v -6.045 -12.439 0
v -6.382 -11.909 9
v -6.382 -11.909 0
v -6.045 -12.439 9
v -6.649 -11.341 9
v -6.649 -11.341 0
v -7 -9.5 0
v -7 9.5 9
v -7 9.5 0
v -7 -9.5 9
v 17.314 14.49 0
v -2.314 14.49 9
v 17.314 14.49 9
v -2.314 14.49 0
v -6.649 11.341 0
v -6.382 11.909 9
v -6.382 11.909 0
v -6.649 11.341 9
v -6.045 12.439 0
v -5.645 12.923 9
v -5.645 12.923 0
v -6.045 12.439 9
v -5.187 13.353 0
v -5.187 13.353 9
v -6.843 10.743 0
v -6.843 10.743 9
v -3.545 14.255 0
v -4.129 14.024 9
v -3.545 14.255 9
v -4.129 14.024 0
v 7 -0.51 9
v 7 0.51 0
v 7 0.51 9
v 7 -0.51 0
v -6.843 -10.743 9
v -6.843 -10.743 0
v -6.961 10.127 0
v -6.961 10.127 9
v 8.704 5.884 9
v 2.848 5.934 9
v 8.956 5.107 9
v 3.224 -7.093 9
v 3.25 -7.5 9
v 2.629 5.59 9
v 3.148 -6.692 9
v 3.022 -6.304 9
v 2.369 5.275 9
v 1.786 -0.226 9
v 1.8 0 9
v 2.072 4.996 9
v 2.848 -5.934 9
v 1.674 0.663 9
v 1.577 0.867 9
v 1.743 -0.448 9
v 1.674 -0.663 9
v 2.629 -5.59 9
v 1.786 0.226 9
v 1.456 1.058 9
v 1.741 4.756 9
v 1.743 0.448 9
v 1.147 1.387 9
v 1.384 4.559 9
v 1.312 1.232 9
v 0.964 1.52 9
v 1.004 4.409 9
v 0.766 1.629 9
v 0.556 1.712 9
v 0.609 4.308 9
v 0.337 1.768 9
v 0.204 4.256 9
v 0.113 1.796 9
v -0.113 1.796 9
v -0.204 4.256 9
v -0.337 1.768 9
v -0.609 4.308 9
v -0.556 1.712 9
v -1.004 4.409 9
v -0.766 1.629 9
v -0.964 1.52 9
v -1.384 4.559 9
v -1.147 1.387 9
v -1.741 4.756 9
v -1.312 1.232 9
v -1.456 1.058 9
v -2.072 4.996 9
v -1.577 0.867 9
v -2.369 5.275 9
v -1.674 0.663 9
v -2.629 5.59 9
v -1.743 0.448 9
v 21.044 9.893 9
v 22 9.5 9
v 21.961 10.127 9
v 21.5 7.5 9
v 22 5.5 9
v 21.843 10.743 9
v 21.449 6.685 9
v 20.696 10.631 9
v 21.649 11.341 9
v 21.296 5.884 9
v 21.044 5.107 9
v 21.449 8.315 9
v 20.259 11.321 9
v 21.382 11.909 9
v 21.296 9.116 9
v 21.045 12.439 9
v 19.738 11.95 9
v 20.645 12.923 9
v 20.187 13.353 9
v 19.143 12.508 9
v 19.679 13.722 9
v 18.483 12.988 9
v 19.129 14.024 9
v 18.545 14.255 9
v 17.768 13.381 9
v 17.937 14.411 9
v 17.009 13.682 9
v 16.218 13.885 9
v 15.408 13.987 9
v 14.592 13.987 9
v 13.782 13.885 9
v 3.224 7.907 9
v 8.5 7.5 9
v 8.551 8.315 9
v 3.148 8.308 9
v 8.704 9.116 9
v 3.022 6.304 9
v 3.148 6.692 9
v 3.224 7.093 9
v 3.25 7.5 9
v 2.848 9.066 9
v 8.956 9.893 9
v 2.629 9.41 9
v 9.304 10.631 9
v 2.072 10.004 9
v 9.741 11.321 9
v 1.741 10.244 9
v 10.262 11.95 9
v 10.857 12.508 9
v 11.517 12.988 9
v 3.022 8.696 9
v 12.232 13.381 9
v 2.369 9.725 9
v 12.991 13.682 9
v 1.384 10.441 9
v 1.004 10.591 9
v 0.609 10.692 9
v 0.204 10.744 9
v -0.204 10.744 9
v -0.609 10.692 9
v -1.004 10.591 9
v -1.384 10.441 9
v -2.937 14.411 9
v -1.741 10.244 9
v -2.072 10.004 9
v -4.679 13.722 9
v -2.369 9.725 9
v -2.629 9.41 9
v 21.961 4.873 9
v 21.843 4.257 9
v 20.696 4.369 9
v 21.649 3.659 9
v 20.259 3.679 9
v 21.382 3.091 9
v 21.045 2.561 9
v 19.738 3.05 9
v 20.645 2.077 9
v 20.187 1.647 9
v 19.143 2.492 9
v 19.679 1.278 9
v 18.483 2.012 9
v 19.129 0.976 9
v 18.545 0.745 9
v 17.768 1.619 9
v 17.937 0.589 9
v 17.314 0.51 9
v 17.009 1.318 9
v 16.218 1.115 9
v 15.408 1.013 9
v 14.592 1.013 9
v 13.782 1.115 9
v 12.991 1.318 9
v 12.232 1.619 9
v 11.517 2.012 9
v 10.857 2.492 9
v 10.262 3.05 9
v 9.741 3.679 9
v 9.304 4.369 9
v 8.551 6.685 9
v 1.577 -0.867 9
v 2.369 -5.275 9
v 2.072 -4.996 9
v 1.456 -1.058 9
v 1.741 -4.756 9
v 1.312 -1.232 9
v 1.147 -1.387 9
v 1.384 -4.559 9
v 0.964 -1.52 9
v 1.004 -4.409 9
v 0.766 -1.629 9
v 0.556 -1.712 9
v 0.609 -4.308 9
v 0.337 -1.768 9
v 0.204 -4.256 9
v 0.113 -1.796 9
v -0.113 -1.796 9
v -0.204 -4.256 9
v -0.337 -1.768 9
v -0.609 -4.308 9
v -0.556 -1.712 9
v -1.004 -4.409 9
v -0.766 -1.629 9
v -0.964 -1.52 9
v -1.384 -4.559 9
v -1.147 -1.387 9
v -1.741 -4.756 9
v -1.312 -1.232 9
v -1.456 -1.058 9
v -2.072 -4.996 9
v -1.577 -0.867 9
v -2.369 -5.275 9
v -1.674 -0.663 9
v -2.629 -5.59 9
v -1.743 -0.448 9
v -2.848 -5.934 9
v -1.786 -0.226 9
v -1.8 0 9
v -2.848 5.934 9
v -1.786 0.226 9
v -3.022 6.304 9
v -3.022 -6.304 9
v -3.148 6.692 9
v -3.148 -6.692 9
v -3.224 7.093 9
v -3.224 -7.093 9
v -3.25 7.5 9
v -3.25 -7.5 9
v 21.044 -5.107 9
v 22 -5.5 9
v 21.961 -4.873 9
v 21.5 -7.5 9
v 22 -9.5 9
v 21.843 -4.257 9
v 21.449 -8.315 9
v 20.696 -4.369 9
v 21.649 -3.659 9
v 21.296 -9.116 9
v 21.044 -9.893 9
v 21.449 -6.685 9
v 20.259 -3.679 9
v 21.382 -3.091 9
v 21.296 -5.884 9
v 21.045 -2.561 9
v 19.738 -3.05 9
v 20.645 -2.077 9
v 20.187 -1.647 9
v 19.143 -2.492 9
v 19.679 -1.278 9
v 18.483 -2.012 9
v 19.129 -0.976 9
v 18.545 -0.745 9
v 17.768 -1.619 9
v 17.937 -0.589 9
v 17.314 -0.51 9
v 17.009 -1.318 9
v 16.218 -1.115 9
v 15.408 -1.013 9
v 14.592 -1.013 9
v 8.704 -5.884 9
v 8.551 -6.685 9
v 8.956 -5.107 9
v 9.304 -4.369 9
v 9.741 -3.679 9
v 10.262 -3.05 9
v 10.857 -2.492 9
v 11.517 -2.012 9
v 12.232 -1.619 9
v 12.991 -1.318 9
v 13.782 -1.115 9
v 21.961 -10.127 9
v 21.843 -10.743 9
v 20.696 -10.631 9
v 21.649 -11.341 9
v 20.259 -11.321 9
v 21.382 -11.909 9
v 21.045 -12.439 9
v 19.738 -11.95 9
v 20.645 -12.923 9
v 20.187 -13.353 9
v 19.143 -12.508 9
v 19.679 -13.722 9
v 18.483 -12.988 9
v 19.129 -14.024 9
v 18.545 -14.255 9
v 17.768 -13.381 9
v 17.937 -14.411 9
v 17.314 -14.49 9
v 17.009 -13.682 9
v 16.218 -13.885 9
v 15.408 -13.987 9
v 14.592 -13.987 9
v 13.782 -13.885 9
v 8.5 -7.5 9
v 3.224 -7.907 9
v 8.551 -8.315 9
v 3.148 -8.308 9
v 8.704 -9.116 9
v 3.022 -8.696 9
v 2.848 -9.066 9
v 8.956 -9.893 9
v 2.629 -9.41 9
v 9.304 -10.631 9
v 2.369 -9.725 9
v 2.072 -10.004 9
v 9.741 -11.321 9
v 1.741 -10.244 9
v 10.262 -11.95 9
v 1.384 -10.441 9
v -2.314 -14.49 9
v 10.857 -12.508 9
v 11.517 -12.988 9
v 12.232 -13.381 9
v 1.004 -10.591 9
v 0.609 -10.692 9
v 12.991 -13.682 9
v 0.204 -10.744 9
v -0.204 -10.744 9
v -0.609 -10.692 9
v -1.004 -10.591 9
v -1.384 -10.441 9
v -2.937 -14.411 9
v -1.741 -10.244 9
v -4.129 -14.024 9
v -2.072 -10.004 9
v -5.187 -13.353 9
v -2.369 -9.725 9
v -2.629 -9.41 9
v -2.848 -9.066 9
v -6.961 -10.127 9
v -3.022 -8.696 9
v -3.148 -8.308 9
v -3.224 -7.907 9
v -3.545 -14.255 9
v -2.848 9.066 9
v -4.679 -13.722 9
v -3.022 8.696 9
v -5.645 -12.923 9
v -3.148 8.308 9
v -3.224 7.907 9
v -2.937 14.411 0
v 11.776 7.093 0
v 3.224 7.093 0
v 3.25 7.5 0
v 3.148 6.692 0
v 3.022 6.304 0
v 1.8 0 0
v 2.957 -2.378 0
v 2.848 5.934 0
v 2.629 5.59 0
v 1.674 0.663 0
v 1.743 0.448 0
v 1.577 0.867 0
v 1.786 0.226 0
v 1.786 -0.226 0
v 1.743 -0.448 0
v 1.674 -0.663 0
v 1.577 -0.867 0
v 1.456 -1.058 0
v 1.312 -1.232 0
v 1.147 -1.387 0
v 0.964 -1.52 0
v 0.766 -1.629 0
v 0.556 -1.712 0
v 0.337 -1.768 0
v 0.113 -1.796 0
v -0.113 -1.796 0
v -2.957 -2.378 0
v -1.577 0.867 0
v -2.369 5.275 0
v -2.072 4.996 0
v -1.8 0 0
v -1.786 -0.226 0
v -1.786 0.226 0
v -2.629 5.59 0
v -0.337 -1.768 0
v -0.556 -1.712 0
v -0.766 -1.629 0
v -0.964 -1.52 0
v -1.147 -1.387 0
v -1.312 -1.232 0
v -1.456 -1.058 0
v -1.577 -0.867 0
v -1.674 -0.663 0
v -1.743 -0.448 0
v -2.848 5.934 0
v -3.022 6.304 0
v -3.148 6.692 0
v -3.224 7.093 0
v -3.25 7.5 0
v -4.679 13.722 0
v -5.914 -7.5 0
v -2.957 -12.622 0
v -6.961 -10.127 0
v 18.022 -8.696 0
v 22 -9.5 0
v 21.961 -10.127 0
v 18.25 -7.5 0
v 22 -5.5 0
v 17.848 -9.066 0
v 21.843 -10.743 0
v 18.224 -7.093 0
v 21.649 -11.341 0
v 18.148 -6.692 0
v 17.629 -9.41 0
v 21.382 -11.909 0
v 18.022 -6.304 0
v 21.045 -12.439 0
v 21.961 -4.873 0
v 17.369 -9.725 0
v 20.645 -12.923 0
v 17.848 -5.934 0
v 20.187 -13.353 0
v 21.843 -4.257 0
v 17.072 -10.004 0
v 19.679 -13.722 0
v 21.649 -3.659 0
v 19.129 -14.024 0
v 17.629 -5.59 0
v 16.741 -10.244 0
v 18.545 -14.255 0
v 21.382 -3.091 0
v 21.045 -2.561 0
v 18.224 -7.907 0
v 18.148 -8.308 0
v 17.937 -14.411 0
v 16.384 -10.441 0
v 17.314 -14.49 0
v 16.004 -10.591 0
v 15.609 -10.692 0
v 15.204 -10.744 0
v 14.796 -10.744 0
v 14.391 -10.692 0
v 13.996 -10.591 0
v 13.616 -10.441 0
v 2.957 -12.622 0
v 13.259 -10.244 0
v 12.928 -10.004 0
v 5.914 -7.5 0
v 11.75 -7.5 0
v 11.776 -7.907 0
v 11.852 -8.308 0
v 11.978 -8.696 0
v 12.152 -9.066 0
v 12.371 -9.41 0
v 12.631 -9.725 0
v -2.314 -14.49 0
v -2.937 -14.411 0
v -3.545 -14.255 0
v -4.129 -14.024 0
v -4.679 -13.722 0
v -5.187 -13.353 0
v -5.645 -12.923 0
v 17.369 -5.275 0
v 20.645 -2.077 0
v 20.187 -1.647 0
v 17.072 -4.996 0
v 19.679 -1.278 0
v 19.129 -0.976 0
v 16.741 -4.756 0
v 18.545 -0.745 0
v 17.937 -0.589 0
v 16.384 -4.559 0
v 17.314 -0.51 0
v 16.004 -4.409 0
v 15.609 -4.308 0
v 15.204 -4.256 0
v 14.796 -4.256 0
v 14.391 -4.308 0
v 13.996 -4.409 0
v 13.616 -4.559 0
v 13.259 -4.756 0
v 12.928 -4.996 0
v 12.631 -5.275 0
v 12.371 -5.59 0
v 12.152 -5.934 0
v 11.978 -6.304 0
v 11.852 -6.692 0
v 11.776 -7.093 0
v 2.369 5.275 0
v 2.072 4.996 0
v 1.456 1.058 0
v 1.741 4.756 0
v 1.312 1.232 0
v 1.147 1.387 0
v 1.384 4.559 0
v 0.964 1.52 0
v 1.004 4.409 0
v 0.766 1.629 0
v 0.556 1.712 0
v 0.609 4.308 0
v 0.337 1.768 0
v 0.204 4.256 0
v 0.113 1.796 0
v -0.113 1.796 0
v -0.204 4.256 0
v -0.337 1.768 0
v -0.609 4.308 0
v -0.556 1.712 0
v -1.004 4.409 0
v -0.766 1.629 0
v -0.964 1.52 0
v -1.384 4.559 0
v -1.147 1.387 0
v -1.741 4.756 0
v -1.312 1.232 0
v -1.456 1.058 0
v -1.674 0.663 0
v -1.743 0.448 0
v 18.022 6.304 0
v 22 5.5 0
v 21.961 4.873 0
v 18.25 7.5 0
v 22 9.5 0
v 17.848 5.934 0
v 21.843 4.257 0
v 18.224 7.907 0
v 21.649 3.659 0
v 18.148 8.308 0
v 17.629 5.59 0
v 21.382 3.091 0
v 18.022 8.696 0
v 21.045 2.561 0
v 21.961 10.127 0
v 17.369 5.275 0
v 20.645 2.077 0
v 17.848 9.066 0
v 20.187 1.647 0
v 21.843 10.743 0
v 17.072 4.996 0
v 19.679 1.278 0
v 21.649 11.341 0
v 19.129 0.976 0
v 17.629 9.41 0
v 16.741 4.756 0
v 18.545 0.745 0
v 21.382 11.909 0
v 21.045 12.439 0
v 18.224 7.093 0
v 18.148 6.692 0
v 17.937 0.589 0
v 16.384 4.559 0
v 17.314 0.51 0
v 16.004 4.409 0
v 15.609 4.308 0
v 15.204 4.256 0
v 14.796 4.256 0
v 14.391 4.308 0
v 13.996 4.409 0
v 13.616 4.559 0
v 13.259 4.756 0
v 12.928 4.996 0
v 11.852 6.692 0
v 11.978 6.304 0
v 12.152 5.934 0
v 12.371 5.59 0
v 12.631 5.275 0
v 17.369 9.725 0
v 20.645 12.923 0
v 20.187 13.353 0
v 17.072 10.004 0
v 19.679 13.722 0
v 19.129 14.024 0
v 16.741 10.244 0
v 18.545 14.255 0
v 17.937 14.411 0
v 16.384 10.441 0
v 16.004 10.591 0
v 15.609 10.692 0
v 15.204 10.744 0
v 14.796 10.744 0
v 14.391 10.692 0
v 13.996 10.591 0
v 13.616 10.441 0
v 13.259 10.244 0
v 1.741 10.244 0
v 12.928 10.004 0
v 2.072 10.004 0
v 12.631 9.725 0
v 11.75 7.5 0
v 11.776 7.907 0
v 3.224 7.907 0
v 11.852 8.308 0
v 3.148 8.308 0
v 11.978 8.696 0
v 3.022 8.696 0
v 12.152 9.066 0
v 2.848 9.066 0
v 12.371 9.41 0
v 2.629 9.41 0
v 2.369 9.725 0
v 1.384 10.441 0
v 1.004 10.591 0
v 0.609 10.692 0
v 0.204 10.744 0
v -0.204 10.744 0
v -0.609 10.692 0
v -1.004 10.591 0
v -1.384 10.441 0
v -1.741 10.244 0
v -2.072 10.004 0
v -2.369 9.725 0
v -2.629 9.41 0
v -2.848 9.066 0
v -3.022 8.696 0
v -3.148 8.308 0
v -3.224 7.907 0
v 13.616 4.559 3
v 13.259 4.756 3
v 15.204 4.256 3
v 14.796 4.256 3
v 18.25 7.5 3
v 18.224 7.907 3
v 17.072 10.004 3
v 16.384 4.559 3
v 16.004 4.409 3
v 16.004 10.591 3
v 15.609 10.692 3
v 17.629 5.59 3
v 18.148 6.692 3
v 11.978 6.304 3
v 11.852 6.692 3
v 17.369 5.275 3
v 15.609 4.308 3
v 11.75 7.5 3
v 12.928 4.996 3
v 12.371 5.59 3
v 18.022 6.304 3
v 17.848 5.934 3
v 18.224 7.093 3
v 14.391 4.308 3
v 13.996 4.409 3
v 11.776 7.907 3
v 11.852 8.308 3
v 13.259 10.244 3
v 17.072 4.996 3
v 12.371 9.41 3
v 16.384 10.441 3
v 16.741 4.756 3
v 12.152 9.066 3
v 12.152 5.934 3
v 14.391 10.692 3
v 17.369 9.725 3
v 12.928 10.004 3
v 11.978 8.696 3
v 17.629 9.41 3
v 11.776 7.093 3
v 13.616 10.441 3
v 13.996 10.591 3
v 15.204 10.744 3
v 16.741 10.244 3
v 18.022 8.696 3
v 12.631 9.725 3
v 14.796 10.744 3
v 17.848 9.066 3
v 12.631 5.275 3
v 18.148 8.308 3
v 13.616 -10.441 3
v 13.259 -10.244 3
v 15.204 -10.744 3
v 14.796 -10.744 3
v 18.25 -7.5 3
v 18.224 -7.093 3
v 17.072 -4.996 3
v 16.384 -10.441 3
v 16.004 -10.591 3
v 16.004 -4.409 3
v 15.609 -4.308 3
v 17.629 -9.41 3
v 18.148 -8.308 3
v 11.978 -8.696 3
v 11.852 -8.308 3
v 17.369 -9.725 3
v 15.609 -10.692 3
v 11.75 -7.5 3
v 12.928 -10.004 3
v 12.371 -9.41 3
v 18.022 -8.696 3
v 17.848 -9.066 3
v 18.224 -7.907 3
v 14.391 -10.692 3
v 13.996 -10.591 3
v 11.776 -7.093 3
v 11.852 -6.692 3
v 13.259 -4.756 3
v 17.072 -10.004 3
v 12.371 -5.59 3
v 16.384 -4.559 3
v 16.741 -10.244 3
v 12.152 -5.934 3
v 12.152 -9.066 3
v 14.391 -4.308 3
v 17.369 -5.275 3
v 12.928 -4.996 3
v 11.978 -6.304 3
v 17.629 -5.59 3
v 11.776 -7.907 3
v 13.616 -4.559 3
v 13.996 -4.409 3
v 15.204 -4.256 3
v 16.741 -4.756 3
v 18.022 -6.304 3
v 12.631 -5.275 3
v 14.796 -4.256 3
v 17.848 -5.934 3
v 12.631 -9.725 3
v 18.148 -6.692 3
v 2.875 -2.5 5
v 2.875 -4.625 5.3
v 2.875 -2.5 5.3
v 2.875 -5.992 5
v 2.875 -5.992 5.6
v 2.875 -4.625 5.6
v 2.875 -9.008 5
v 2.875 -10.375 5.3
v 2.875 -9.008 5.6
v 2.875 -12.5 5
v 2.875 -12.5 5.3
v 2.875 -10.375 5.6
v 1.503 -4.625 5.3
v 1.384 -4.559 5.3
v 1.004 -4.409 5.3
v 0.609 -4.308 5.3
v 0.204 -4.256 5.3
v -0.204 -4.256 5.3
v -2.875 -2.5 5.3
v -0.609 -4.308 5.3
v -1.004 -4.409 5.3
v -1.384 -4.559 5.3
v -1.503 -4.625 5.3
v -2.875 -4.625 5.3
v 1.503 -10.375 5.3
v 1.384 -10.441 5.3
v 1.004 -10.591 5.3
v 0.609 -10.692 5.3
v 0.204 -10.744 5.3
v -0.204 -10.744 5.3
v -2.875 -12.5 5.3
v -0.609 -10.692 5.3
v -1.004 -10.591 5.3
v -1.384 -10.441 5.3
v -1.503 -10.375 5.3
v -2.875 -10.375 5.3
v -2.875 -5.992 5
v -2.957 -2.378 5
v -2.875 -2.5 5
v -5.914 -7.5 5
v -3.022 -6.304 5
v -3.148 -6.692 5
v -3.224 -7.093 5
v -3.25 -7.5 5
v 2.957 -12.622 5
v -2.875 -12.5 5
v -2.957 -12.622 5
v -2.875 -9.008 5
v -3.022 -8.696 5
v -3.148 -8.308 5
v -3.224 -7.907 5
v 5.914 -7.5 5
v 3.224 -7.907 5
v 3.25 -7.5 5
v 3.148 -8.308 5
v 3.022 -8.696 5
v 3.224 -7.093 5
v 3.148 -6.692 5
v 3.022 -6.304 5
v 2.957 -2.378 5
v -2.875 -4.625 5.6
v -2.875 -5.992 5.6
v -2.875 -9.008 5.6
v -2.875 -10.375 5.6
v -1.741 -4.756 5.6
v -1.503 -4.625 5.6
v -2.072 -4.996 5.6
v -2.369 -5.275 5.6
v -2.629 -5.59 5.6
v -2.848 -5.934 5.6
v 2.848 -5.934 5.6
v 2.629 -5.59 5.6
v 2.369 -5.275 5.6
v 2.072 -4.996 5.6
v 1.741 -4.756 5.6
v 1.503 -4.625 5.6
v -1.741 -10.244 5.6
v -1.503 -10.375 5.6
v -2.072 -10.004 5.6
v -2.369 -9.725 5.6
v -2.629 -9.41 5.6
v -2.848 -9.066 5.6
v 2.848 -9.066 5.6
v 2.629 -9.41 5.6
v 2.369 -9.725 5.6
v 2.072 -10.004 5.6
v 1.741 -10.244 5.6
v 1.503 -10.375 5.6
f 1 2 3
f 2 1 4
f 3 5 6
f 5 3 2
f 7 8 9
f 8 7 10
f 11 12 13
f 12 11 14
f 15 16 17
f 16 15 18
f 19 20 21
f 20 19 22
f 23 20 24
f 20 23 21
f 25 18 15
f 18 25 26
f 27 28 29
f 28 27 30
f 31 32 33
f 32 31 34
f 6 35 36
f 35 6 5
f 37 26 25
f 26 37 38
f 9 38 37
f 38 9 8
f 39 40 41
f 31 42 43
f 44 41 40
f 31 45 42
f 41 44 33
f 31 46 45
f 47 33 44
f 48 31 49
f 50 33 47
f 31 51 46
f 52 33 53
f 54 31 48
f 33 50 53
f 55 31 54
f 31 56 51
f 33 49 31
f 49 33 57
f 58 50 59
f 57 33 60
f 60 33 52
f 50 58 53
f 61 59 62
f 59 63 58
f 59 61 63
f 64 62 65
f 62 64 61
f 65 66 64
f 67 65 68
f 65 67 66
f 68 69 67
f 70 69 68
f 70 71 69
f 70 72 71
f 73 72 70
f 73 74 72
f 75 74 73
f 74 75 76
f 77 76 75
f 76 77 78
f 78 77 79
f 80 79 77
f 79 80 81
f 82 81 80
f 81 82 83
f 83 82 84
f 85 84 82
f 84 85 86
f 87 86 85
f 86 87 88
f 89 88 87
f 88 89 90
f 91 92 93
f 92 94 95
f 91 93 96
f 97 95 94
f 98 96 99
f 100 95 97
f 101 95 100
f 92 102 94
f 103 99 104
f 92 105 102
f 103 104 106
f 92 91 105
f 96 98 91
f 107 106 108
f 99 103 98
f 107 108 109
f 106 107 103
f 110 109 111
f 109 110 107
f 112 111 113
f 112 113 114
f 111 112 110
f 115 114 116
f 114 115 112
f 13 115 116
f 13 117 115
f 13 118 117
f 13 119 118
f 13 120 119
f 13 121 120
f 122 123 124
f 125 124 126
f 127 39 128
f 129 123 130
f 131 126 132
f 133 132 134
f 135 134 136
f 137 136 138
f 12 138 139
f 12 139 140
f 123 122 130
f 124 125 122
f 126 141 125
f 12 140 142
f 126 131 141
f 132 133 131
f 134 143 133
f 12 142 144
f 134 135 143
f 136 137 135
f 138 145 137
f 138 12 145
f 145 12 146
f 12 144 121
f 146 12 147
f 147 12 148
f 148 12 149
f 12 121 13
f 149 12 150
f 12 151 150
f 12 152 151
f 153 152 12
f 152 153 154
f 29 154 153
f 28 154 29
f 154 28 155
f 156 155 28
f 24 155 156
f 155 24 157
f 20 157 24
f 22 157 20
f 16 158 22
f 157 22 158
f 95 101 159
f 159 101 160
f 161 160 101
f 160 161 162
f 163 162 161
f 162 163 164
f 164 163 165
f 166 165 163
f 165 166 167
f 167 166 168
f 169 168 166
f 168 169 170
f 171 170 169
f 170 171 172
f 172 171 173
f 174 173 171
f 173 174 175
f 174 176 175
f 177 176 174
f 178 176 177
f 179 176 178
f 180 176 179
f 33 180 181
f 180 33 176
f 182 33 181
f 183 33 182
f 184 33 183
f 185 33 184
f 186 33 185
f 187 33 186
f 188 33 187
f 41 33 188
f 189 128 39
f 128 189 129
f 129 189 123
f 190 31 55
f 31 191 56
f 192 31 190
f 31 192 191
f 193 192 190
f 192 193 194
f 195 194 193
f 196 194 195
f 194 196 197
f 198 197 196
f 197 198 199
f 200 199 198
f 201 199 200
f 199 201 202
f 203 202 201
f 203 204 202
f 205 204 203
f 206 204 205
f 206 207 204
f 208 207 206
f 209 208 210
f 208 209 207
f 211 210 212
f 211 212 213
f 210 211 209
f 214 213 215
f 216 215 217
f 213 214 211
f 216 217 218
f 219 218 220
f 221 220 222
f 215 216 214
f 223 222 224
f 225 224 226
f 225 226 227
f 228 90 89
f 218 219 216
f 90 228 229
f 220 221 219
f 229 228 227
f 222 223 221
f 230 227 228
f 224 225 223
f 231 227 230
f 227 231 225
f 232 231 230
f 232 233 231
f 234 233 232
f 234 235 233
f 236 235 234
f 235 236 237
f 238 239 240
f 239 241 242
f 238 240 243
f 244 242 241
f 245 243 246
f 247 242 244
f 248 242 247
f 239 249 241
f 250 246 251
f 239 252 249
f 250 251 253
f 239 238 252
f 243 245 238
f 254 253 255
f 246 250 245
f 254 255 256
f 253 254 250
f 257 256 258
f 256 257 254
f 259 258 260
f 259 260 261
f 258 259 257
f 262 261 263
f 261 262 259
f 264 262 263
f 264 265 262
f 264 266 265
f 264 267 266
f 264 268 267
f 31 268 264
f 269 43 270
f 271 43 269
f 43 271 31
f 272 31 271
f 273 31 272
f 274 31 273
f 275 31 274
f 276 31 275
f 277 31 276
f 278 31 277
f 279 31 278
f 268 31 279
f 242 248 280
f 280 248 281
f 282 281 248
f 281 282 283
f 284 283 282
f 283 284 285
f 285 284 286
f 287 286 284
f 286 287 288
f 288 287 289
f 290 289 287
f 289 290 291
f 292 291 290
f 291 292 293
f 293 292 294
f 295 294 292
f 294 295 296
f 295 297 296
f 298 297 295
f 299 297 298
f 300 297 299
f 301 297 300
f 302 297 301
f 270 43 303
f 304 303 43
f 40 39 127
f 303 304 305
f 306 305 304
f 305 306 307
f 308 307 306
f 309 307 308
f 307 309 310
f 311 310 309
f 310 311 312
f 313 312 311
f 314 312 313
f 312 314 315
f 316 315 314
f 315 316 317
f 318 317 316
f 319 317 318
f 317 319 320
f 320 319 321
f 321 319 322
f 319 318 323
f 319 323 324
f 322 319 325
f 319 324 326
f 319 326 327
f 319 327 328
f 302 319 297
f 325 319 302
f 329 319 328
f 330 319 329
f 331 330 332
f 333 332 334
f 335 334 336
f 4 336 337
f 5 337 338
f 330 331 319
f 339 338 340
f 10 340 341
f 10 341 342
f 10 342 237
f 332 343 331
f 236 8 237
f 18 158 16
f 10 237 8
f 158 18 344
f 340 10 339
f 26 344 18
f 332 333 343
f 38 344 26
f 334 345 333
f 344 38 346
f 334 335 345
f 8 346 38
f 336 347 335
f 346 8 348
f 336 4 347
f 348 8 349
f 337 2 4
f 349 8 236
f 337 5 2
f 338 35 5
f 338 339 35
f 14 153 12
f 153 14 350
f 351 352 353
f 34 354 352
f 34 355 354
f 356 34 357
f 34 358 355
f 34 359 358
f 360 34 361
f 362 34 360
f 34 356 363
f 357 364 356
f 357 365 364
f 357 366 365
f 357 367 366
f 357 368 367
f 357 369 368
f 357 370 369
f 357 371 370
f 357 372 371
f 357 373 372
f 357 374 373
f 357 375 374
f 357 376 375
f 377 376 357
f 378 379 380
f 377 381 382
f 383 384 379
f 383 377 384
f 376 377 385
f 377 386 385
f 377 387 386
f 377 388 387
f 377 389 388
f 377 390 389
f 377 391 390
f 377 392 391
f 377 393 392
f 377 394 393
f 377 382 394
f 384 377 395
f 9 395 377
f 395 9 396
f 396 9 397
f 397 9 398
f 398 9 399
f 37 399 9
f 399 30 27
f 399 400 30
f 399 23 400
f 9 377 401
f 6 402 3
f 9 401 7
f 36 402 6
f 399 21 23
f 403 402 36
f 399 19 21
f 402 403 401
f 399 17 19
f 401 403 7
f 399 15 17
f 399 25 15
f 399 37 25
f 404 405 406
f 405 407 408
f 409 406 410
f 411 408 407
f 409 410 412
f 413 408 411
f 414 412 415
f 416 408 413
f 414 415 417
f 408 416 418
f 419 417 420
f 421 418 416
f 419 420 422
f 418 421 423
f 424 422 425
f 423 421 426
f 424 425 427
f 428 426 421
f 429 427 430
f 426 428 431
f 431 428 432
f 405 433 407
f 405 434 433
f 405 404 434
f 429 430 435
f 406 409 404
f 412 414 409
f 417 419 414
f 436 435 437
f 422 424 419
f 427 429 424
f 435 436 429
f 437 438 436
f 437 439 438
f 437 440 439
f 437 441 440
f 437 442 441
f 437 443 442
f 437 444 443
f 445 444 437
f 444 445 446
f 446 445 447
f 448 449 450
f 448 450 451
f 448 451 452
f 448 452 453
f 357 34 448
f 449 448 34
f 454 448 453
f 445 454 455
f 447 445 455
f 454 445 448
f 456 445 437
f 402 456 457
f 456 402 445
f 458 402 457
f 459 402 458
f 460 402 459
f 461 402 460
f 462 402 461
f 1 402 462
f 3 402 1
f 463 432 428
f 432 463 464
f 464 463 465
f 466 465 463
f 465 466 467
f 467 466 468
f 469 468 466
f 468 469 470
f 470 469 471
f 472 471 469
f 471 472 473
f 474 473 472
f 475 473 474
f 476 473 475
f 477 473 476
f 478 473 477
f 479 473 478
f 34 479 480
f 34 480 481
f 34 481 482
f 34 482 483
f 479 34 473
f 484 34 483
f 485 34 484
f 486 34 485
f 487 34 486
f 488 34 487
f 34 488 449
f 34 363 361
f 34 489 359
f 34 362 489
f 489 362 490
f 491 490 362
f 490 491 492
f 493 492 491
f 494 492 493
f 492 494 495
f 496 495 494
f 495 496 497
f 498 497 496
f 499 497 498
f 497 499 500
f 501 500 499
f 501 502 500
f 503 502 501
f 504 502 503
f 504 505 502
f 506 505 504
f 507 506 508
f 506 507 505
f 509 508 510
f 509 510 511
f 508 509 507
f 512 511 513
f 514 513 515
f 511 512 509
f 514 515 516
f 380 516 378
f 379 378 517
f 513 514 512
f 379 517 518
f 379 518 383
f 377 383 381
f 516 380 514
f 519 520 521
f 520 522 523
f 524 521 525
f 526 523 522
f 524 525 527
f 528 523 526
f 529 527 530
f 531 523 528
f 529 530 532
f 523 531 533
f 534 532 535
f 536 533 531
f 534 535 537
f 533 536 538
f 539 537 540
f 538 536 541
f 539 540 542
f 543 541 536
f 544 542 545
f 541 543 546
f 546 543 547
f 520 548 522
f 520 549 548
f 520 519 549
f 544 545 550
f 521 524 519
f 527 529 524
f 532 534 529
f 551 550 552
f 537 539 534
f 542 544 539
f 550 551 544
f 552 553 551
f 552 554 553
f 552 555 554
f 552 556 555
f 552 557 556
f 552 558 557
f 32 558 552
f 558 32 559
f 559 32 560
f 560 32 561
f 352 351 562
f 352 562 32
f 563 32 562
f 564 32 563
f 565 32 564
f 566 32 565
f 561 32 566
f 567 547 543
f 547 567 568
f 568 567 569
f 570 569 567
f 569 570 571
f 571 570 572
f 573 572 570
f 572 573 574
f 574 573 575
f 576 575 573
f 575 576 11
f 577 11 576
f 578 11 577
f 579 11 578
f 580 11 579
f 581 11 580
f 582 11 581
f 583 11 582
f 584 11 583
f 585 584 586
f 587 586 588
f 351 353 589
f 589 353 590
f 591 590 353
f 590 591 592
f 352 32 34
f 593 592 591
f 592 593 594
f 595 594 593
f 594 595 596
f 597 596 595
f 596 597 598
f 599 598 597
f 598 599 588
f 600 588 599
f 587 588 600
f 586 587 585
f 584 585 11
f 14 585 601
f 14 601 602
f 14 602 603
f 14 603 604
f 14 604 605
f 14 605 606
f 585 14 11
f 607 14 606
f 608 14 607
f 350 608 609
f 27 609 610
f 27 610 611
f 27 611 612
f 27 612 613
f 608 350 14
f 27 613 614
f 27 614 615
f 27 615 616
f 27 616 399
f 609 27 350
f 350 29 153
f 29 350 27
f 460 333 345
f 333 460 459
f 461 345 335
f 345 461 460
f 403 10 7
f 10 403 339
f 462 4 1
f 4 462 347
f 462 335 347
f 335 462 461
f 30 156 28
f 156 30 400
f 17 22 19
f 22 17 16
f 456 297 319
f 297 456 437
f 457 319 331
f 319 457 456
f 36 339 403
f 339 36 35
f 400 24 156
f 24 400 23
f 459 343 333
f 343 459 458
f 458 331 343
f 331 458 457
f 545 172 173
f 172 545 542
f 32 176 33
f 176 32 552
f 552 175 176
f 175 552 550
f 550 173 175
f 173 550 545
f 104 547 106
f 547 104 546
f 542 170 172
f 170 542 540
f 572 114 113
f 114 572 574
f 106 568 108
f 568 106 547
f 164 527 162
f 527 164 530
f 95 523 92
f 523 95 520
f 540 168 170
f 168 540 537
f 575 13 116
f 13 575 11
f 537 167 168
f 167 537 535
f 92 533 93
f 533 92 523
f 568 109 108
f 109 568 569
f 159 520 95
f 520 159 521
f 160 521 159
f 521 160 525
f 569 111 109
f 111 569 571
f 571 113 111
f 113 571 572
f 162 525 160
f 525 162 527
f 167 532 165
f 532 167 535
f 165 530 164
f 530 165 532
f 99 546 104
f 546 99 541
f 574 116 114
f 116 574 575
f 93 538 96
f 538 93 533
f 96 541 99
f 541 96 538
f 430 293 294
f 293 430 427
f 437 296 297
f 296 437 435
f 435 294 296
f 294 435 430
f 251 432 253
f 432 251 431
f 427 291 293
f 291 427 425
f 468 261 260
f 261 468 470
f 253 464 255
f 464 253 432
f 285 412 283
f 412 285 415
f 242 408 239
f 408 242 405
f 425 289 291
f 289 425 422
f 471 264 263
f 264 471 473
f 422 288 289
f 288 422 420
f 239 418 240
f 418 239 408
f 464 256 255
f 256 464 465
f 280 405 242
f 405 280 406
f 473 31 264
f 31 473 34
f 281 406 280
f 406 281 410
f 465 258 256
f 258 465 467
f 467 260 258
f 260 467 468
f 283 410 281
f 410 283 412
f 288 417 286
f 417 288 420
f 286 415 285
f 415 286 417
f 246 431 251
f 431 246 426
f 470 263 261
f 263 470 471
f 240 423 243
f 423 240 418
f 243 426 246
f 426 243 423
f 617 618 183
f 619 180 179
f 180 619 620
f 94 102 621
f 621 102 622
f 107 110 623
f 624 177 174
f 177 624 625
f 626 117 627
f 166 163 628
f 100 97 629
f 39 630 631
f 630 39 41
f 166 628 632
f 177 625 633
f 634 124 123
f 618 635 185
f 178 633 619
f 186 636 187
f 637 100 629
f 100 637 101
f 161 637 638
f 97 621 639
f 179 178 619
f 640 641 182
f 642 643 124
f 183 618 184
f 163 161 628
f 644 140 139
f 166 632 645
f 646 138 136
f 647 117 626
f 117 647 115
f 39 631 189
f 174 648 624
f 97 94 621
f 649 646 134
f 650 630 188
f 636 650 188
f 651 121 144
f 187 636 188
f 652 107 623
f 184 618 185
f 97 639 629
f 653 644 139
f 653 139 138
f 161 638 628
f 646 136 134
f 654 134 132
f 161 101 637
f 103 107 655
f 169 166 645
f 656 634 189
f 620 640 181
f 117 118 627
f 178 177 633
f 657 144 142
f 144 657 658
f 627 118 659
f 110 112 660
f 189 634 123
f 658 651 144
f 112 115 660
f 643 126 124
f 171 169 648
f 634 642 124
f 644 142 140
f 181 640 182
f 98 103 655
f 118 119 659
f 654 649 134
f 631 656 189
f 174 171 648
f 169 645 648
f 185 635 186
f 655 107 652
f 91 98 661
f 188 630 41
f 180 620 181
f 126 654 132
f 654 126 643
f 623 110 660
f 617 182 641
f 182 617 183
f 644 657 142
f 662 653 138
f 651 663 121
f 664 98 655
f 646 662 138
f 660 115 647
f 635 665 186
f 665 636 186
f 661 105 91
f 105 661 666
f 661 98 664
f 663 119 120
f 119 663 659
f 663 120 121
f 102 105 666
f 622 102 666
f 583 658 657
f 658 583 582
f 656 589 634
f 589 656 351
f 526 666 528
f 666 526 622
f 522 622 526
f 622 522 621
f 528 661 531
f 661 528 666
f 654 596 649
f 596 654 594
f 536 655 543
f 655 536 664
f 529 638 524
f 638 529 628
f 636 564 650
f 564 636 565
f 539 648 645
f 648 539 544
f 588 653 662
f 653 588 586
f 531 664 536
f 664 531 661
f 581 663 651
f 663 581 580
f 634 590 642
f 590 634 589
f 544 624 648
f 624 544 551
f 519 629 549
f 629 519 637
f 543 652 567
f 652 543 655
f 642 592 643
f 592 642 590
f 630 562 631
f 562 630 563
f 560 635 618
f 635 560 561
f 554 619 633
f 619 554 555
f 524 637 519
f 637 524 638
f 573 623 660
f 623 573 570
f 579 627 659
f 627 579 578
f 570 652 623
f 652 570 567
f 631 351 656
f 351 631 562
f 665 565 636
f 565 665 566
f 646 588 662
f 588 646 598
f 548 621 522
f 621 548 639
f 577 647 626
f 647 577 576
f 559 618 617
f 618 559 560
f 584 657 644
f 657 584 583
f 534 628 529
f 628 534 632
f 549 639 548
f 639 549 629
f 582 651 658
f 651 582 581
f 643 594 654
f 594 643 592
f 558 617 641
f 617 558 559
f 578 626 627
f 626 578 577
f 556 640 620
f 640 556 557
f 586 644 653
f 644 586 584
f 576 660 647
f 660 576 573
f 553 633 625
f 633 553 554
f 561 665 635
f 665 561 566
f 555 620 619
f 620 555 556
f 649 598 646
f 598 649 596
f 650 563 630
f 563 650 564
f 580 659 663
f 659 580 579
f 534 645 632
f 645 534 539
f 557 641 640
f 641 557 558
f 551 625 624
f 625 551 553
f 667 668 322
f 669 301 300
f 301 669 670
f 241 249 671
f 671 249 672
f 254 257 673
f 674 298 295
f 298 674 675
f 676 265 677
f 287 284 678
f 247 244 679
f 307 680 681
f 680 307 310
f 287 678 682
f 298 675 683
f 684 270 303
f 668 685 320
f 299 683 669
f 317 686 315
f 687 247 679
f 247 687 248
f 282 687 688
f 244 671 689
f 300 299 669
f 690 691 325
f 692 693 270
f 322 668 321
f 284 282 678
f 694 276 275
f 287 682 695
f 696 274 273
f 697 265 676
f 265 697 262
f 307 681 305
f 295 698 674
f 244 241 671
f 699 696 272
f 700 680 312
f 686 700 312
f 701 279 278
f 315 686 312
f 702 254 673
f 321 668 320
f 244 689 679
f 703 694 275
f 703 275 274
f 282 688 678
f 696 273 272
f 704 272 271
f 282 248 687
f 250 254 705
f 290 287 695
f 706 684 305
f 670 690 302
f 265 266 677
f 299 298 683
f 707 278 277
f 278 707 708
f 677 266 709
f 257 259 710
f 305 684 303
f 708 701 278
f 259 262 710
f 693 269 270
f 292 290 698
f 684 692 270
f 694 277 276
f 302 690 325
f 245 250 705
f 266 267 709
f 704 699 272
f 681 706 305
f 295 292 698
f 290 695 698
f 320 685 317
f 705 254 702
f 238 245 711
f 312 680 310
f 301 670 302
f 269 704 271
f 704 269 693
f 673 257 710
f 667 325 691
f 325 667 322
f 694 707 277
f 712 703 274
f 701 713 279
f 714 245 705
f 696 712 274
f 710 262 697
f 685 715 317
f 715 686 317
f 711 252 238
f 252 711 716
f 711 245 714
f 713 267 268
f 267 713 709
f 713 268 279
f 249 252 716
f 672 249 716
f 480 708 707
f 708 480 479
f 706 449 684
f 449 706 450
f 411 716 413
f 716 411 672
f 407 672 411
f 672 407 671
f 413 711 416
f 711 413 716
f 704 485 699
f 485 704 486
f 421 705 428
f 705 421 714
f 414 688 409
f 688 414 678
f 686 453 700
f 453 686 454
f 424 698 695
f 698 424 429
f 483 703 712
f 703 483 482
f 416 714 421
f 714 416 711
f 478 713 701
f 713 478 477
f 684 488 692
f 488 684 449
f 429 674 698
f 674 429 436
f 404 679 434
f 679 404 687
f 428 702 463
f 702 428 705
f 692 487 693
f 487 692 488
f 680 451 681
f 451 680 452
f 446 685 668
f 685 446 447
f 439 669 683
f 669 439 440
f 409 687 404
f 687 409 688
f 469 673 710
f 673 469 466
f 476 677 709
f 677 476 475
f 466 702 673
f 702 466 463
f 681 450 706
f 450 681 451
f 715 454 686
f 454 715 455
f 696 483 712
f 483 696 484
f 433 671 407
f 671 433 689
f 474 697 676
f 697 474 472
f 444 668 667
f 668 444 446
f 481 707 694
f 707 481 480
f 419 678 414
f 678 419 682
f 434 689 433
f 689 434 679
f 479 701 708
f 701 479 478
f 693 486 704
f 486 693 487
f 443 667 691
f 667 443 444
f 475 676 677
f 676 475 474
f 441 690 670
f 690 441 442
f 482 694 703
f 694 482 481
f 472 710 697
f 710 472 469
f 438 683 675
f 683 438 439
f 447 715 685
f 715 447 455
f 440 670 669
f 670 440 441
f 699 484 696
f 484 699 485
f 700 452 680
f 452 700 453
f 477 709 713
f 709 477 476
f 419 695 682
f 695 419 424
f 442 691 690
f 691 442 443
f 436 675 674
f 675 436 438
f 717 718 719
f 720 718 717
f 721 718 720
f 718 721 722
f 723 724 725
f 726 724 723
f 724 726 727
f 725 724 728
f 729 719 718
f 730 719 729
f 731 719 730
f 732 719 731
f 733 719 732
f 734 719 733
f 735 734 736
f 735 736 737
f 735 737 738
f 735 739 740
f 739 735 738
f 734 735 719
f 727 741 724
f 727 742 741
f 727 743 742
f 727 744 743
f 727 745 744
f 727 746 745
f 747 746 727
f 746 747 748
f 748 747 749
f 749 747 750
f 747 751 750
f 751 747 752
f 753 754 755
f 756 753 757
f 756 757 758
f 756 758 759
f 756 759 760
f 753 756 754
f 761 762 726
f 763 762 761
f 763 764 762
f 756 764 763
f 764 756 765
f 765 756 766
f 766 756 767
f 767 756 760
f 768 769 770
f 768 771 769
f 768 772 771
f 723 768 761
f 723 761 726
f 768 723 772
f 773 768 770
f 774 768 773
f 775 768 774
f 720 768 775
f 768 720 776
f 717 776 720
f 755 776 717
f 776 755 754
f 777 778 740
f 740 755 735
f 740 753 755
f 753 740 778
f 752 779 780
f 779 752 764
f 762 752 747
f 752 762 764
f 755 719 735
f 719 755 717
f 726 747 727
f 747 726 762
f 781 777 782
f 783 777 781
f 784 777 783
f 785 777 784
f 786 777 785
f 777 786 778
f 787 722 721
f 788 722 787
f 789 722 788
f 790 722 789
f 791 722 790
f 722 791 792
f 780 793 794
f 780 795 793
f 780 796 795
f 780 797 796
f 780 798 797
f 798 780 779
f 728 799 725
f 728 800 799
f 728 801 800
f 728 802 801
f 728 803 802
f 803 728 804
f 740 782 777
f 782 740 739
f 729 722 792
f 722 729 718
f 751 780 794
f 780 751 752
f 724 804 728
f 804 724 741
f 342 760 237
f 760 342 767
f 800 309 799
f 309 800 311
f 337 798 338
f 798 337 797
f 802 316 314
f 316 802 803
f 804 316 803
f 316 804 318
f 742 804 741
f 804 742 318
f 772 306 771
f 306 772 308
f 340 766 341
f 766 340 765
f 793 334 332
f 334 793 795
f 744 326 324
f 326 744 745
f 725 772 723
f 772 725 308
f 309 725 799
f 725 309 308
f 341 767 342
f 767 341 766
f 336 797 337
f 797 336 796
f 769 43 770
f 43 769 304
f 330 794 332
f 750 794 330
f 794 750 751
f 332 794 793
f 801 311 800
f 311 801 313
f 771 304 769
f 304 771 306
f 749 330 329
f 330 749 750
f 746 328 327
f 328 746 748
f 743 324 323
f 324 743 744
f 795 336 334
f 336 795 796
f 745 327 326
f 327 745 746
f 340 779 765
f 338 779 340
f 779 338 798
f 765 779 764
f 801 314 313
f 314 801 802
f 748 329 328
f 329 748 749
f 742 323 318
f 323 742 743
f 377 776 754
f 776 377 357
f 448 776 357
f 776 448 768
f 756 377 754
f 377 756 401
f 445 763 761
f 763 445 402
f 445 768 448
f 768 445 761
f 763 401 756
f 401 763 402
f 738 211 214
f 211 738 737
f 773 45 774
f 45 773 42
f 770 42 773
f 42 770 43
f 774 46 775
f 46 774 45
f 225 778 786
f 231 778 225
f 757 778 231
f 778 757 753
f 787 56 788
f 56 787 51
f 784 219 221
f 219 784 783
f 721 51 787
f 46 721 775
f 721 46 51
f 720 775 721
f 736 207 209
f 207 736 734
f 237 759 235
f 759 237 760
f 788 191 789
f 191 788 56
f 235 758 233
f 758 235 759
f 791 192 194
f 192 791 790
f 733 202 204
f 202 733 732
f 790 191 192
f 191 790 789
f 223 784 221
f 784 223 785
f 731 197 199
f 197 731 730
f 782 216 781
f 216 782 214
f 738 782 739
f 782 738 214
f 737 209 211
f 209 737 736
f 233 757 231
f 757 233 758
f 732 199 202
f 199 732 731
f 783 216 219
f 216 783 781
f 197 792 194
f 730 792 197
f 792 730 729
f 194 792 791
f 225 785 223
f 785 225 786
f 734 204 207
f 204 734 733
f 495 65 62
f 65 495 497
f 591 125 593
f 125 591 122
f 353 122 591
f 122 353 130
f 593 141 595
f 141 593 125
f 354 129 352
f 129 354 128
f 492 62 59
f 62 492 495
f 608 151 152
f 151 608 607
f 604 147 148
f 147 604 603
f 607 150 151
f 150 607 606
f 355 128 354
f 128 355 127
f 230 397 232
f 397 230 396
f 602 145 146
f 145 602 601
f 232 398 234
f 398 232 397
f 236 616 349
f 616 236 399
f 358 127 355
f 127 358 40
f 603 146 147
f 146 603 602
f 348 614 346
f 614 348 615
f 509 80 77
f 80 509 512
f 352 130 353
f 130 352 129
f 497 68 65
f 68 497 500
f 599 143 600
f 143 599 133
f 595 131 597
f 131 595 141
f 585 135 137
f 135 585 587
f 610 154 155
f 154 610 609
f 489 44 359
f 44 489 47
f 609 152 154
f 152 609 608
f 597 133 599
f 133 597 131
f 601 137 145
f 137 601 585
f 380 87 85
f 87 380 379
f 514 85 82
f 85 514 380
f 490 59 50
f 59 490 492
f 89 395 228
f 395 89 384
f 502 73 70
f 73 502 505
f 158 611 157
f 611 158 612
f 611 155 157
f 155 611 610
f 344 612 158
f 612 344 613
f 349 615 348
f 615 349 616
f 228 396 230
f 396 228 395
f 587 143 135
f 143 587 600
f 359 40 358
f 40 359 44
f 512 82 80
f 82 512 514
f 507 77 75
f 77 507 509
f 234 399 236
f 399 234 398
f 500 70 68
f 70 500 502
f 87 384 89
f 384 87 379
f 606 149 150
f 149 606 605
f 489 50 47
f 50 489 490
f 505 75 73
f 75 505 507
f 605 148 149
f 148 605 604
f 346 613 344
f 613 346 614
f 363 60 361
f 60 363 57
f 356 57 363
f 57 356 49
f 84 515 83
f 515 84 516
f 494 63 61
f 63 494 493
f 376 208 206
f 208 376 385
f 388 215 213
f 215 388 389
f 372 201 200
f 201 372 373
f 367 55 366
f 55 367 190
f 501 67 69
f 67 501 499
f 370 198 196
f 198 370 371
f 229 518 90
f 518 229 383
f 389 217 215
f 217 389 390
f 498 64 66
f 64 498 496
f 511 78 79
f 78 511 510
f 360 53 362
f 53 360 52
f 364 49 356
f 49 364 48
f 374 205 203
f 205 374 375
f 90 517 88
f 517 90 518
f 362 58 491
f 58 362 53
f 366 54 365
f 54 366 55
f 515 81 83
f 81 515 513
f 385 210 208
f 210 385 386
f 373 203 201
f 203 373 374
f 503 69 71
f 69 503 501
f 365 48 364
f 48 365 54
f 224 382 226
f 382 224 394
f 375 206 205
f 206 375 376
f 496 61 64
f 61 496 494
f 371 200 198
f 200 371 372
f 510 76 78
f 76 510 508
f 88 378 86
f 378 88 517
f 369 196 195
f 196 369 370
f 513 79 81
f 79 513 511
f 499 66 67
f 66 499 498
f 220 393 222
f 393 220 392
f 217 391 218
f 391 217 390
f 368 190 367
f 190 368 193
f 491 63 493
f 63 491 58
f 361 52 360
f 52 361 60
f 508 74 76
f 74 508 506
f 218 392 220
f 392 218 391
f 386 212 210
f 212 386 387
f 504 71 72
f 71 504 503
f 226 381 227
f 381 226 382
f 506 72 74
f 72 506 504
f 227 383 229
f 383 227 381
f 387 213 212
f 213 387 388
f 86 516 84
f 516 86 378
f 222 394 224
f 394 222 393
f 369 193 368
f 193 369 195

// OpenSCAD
$fn = 50;


difference() {
	union() {
		hull() {
			translate(v = [-2.0000000000, 9.5000000000, 0]) {
				cylinder(h = 9, r = 5);
			}
			translate(v = [2.0000000000, 9.5000000000, 0]) {
				cylinder(h = 9, r = 5);
			}
			translate(v = [-2.0000000000, -9.5000000000, 0]) {
				cylinder(h = 9, r = 5);
			}
			translate(v = [2.0000000000, -9.5000000000, 0]) {
				cylinder(h = 9, r = 5);
			}
		}
		translate(v = [7.5000000000, 7.5000000000, 0]) {
			hull() {
				translate(v = [-9.5000000000, 2.0000000000, 0]) {
					cylinder(h = 9, r = 5);
				}
				translate(v = [9.5000000000, 2.0000000000, 0]) {
					cylinder(h = 9, r = 5);
				}
				translate(v = [-9.5000000000, -2.0000000000, 0]) {
					cylinder(h = 9, r = 5);
				}
				translate(v = [9.5000000000, -2.0000000000, 0]) {
					cylinder(h = 9, r = 5);
				}
			}
		}
		translate(v = [7.5000000000, -7.5000000000, 0]) {
			hull() {
				translate(v = [-9.5000000000, 2.0000000000, 0]) {
					cylinder(h = 9, r = 5);
				}
				translate(v = [9.5000000000, 2.0000000000, 0]) {
					cylinder(h = 9, r = 5);
				}
				translate(v = [-9.5000000000, -2.0000000000, 0]) {
					cylinder(h = 9, r = 5);
				}
				translate(v = [9.5000000000, -2.0000000000, 0]) {
					cylinder(h = 9, r = 5);
				}
			}
		}
	}
	union() {
		translate(v = [15.0000000000, 7.5000000000, 9]) {
			rotate(a = [0, 0, 0]) {
				difference() {
					union() {
						#translate(v = [0, 0, -9.0000000000]) {
							cylinder(h = 9, r = 2.2500000000);
						}
						#translate(v = [0, 0, -6]) {
							cylinder(h = 6, r1 = 3.2500000000, r2 = 6.5000000000);
						}
						#translate(v = [0, 0, -9.0000000000]) {
							cylinder(h = 9, r = 3.2500000000);
						}
						#translate(v = [0, 0, -9.0000000000]) {
							cylinder(h = 9, r = 2.2500000000);
						}
					}
					union();
				}
			}
		}
		translate(v = [15.0000000000, -7.5000000000, 9]) {
			rotate(a = [0, 0, 0]) {
				difference() {
					union() {
						#translate(v = [0, 0, -9.0000000000]) {
							cylinder(h = 9, r = 2.2500000000);
						}
						#translate(v = [0, 0, -6]) {
							cylinder(h = 6, r1 = 3.2500000000, r2 = 6.5000000000);
						}
						#translate(v = [0, 0, -9.0000000000]) {
							cylinder(h = 9, r = 3.2500000000);
						}
						#translate(v = [0, 0, -9.0000000000]) {
							cylinder(h = 9, r = 2.2500000000);
						}
					}
					union();
				}
			}
		}
		translate(v = [0.0000000000, -7.5000000000, 0]) {
			rotate(a = [0, 0, 0]) {
				difference() {
					union() {
						#translate(v = [-2.8750000000, -5.0000000000, -0.3000000000]) {
							cube(size = [5.7500000000, 10, 0.3000000000]);
						}
						#translate(v = [-2.8750000000, -2.8750000000, -0.6000000000]) {
							cube(size = [5.7500000000, 5.7500000000, 0.3000000000]);
						}
						#translate(v = [-2.8750000000, -5.0000000000, 5]) {
							cube(size = [5.7500000000, 10, 0.3000000000]);
						}
						#translate(v = [-2.8750000000, -2.8750000000, 5.3000000000]) {
							cube(size = [5.7500000000, 5.7500000000, 0.3000000000]);
						}
						#translate(v = [0, 0, -100.0000000000]) {
							cylinder(h = 200, r = 3.2500000000);
						}
						#linear_extrude(height = 5) {
							polygon(points = [[5.9142500000, 0.0000000000], [2.9571250000, 5.1218907443], [-2.9571250000, 5.1218907443], [-5.9142500000, 0.0000000000], [-2.9571250000, -5.1218907443], [2.9571250000, -5.1218907443]]);
						}
						#translate(v = [-2.8750000000, -5.0000000000, -0.3000000000]) {
							cube(size = [5.7500000000, 10, 0.3000000000]);
						}
						#translate(v = [-2.8750000000, -2.8750000000, -0.6000000000]) {
							cube(size = [5.7500000000, 5.7500000000, 0.3000000000]);
						}
						#translate(v = [-2.8750000000, -5.0000000000, 5]) {
							cube(size = [5.7500000000, 10, 0.3000000000]);
						}
						#translate(v = [-2.8750000000, -2.8750000000, 5.3000000000]) {
							cube(size = [5.7500000000, 5.7500000000, 0.3000000000]);
						}
						#translate(v = [0, 0, -100.0000000000]) {
							cylinder(h = 200, r = 3.2500000000);
						}
						#translate(v = [-2.8750000000, -5.0000000000, -0.3000000000]) {
							cube(size = [5.7500000000, 10, 0.3000000000]);
						}
						#translate(v = [-2.8750000000, -2.8750000000, -0.6000000000]) {
							cube(size = [5.7500000000, 5.7500000000, 0.3000000000]);
						}
						#translate(v = [-2.8750000000, -5.0000000000, 5]) {
							cube(size = [5.7500000000, 10, 0.3000000000]);
						}
						#translate(v = [-2.8750000000, -2.8750000000, 5.3000000000]) {
							cube(size = [5.7500000000, 5.7500000000, 0.3000000000]);
						}
						#translate(v = [0, 0, -100.0000000000]) {
							cylinder(h = 200, r = 3.2500000000);
						}
					}
					union();
				}
			}
		}
		translate(v = [0.0000000000, -7.5000000000, 0]) {
			translate(v = [0, 0, -100]) {
				cylinder(h = 200, r = 3.2500000000);
			}
		}
		translate(v = [0.0000000000, 7.5000000000, 0]) {
			translate(v = [0, 0, -100]) {
				cylinder(h = 200, r = 3.2500000000);
			}
		}
		translate(v = [0.0000000000, -7.5000000000, 0]) {
			translate(v = [0, 0, -100]) {
				cylinder(h = 200, r = 1.8000000000);
			}
		}
		translate(v = [0, 0, -100]) {
			cylinder(h = 200, r = 1.8000000000);
		}
		translate(v = [0.0000000000, 7.5000000000, 0]) {
			translate(v = [0, 0, -100]) {
				cylinder(h = 200, r = 1.8000000000);
			}
		}
	}
}
